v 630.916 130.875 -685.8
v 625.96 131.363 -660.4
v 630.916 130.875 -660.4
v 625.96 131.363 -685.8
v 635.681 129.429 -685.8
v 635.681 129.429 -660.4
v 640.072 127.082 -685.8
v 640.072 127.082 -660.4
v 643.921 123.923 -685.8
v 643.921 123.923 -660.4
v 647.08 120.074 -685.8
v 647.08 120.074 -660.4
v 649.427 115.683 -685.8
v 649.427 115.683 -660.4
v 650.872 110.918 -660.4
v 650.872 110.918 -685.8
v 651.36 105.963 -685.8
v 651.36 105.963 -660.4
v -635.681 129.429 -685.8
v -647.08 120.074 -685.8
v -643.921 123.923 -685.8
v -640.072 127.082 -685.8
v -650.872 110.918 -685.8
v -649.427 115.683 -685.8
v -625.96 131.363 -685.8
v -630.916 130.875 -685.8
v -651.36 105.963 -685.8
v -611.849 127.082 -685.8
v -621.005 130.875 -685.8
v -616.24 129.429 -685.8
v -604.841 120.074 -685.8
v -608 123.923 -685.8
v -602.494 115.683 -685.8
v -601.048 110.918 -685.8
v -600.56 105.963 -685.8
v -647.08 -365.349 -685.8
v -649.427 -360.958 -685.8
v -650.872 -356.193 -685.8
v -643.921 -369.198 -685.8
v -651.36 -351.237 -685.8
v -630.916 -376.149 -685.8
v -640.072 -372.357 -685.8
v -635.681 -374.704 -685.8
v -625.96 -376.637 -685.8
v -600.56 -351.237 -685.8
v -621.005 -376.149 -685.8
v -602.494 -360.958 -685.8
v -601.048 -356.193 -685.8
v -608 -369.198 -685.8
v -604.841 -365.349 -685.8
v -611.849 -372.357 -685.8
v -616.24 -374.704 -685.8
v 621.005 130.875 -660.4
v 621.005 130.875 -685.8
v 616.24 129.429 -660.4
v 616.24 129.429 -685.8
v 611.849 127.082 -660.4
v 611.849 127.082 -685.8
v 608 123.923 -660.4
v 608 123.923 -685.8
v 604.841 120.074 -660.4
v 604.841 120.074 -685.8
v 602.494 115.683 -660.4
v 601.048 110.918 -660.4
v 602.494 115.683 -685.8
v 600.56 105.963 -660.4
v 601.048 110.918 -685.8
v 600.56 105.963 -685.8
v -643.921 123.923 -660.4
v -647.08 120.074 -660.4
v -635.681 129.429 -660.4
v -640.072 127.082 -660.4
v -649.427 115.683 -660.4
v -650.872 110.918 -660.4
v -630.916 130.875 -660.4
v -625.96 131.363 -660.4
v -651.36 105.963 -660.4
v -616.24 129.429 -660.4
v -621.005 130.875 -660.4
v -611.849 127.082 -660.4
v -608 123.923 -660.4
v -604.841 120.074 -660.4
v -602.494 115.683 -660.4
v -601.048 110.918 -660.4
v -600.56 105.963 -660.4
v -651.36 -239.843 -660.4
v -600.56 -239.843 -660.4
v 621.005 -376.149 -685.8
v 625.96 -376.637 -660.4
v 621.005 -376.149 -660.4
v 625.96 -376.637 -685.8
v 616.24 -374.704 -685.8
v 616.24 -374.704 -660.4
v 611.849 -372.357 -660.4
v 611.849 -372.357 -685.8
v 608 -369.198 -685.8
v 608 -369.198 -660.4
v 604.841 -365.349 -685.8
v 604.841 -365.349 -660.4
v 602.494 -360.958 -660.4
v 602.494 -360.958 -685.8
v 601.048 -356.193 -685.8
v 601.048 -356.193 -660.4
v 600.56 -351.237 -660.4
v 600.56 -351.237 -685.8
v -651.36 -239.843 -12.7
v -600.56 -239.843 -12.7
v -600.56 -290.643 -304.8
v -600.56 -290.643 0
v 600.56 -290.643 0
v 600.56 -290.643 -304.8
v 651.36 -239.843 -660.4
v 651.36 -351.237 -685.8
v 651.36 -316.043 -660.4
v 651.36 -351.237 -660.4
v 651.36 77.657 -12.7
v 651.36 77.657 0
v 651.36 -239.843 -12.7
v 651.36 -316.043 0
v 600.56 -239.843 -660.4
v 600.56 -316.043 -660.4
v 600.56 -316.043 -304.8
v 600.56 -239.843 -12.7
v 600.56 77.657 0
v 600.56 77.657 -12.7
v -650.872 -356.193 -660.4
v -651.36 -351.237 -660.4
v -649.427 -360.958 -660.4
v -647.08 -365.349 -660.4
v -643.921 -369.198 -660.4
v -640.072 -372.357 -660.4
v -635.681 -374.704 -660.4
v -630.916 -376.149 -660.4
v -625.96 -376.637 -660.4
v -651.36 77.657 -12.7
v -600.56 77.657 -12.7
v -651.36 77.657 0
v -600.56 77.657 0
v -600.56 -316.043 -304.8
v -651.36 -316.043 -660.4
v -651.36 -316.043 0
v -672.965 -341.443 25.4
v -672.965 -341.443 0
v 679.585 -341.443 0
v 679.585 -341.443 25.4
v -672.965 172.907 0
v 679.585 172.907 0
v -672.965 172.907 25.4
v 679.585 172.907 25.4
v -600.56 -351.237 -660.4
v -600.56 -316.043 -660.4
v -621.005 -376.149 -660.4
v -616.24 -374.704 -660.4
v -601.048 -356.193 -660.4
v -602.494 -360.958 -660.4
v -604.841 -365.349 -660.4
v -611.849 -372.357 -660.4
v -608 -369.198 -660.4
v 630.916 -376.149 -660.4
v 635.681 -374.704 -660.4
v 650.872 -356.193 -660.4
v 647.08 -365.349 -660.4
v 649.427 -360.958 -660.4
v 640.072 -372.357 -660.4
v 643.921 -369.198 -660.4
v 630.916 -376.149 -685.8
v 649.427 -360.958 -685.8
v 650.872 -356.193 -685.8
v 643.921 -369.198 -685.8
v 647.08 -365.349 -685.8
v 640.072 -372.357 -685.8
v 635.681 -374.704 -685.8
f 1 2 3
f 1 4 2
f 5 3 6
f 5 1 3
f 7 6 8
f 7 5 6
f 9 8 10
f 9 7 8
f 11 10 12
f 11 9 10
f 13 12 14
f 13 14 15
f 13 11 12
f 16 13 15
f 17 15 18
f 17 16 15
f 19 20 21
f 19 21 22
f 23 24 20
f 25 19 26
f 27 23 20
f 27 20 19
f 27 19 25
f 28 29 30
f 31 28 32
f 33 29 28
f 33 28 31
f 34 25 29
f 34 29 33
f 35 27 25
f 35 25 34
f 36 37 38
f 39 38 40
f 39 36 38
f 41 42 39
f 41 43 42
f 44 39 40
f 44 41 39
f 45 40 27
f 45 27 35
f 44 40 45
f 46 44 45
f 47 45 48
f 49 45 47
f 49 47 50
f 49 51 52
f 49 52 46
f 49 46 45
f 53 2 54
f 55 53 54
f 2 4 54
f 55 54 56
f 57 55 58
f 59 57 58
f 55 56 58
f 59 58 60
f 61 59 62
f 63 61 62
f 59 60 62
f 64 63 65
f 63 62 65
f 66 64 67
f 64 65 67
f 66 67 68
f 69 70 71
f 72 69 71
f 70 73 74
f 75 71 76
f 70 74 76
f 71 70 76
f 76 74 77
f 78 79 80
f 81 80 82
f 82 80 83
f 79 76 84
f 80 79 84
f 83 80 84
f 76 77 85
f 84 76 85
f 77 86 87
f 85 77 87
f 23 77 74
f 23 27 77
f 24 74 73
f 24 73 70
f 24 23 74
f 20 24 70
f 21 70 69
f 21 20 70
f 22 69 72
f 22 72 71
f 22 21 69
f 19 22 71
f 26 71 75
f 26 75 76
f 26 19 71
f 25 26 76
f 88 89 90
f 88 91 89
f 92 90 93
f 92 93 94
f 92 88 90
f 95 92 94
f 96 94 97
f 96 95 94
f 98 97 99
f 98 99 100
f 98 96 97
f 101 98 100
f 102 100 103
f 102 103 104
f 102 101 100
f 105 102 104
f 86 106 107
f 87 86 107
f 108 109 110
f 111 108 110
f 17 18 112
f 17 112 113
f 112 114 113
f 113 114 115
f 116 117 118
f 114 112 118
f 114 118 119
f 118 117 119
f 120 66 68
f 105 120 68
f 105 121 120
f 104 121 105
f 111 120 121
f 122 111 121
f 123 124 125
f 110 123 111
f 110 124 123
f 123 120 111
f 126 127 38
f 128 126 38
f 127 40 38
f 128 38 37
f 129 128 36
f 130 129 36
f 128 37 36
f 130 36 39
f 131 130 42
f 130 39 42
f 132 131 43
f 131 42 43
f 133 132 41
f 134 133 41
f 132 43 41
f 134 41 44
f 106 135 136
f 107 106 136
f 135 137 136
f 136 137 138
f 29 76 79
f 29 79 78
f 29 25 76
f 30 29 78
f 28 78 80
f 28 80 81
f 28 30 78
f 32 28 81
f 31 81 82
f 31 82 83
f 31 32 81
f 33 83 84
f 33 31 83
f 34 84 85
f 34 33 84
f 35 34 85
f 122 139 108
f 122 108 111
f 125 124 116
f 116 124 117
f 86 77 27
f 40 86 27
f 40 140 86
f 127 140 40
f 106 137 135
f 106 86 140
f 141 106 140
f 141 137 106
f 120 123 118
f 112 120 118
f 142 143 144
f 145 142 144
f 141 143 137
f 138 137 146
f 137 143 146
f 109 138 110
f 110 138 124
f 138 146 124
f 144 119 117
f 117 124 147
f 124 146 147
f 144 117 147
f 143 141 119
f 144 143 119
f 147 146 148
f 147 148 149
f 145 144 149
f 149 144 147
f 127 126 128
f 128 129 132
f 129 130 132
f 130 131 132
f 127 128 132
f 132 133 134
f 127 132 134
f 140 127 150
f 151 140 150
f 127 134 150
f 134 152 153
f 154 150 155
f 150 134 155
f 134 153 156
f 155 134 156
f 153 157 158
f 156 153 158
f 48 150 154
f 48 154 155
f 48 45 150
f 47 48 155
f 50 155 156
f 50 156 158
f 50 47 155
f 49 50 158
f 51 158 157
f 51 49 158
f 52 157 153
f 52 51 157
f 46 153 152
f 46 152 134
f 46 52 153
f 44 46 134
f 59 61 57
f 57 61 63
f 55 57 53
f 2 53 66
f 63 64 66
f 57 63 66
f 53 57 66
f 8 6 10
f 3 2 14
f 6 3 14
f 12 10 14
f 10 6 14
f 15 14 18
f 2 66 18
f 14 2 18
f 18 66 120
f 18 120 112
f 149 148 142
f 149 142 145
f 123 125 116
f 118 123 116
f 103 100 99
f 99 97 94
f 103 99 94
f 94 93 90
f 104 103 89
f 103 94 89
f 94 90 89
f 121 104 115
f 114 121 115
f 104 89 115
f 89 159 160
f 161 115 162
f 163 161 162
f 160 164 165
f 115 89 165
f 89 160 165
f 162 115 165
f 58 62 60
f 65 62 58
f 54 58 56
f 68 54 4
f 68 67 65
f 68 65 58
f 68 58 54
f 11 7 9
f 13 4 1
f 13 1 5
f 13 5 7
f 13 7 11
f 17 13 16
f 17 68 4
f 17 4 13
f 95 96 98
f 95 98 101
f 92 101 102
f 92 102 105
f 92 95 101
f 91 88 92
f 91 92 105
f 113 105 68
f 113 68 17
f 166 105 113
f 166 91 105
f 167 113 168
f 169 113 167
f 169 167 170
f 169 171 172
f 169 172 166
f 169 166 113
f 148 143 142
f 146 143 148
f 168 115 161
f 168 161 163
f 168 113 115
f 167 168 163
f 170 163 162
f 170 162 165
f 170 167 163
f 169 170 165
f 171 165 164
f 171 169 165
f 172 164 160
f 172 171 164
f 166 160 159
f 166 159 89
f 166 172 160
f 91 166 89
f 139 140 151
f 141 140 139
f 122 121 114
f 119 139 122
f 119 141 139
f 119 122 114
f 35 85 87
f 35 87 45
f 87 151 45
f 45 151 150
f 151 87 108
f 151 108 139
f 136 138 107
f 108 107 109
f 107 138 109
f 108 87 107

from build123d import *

# Parameters (mm, degrees)
F0_W      = 1352.55
F0_H      = 514.35
F1_DEPTH  = 25.4
F2_W      = 50.8
F2_H      = 317.5
F3_DEPTH  = 38.1
F4_W      = 50.8
F4_H      = 76.2
F5_DEPTH  = 660.4
F6_W      = 50.8
F6_H      = 508
F7_DEPTH  = 25.4
F8_R      = 25.4
F9_R      = 25.39999
F10_R     = 25.4
F11_R     = 25.39999
F12_R     = 25.39999
F13_R     = 25.39999
F14_W     = 1201.120785141
F14_H     = 25.4
F15_DEPTH = 304.8


# Not quite as in the source:
# - a fillet or chamfer is up to 0.001 mm smaller than in the source, because OpenCascade refuses the exact size


with BuildPart() as f1:
    # F0 (on Top) → F1 (new body)
    with BuildSketch(Plane.XY):
        with Locations((3.3097676933, -84.2684167102)):
            Rectangle(F0_W, F0_H)
    extrude(amount=F1_DEPTH)

    # F2 (on face) → F3 (join)
    with BuildSketch(Plane.XY.offset(25.4)):
        with Locations((-625.9603925705, -81.0934167102)):
            Rectangle(F2_W, F2_H)
        with Locations((625.9603925705, -81.0934167102)):
            Rectangle(F2_W, F2_H)
    extrude(amount=-F3_DEPTH)

    # F4 (on face) → F5 (join)
    with BuildSketch(Plane(origin=(0, 0, 0), x_dir=(1, 0, 0), z_dir=(0, 0, -1))):
        with Locations((-625.9603925705, 277.9434167102)):
            Rectangle(F4_W, F4_H)
        with Locations((625.9603925705, 277.9434167102)):
            Rectangle(F4_W, F4_H)
    extrude(amount=F5_DEPTH)

    # F6 (on face) → F7 (join)
    with BuildSketch(Plane(origin=(0, 0, -660.4), x_dir=(1, 0, 0), z_dir=(0, 0, -1))):
        with Locations((625.9603925705, 122.6374032485)):
            Rectangle(F6_W, F6_H)
        with Locations((-625.9603925705, 122.6374032485)):
            Rectangle(F6_W, F6_H)
    extrude(amount=F7_DEPTH)

    # F8
    f8_edges = [f1.edges().sort_by_distance(p)[0] for p in [
        (651.360393, 131.362597, -673.1),
    ]]
    fillet(f8_edges, radius=F8_R)

    # F9 (radius 25.4 in the source; OpenCascade refuses exactly that, so slightly less here)
    f9_edges = [f1.edges().sort_by_distance(p)[0] for p in [
        (600.560393, 131.362597, -673.1),
    ]]
    fillet(f9_edges, radius=F9_R)

    # F10
    f10_edges = [f1.edges().sort_by_distance(p)[0] for p in [
        (651.360393, -376.637403, -673.1),
    ]]
    fillet(f10_edges, radius=F10_R)

    # F11 (radius 25.4 in the source; OpenCascade refuses exactly that, so slightly less here)
    f11_edges = [f1.edges().sort_by_distance(p)[0] for p in [
        (600.560393, -376.637403, -673.1),
    ]]
    fillet(f11_edges, radius=F11_R)

    # F12 (radius 25.4 in the source; OpenCascade refuses exactly that, so slightly less here)
    f12_edges = [f1.edges().sort_by_distance(p)[0] for p in [
        (-600.560393, -376.637403, -673.1),
        (-651.360393, -376.637403, -673.1),
    ]]
    fillet(f12_edges, radius=F12_R)

    # F13 (radius 25.4 in the source; OpenCascade refuses exactly that, so slightly less here)
    f13_edges = [f1.edges().sort_by_distance(p)[0] for p in [
        (-651.360393, 131.362597, -673.1),
        (-600.560393, 131.362597, -673.1),
    ]]
    fillet(f13_edges, radius=F13_R)

    # F14 (on face) → F15 (join)
    with BuildSketch(Plane(origin=(0, 0, 0), x_dir=(1, 0, 0), z_dir=(0, 0, -1))):
        with Locations((0, 303.3434167102)):
            Rectangle(F14_W, F14_H)
    extrude(amount=F15_DEPTH)


solid = f1.part
